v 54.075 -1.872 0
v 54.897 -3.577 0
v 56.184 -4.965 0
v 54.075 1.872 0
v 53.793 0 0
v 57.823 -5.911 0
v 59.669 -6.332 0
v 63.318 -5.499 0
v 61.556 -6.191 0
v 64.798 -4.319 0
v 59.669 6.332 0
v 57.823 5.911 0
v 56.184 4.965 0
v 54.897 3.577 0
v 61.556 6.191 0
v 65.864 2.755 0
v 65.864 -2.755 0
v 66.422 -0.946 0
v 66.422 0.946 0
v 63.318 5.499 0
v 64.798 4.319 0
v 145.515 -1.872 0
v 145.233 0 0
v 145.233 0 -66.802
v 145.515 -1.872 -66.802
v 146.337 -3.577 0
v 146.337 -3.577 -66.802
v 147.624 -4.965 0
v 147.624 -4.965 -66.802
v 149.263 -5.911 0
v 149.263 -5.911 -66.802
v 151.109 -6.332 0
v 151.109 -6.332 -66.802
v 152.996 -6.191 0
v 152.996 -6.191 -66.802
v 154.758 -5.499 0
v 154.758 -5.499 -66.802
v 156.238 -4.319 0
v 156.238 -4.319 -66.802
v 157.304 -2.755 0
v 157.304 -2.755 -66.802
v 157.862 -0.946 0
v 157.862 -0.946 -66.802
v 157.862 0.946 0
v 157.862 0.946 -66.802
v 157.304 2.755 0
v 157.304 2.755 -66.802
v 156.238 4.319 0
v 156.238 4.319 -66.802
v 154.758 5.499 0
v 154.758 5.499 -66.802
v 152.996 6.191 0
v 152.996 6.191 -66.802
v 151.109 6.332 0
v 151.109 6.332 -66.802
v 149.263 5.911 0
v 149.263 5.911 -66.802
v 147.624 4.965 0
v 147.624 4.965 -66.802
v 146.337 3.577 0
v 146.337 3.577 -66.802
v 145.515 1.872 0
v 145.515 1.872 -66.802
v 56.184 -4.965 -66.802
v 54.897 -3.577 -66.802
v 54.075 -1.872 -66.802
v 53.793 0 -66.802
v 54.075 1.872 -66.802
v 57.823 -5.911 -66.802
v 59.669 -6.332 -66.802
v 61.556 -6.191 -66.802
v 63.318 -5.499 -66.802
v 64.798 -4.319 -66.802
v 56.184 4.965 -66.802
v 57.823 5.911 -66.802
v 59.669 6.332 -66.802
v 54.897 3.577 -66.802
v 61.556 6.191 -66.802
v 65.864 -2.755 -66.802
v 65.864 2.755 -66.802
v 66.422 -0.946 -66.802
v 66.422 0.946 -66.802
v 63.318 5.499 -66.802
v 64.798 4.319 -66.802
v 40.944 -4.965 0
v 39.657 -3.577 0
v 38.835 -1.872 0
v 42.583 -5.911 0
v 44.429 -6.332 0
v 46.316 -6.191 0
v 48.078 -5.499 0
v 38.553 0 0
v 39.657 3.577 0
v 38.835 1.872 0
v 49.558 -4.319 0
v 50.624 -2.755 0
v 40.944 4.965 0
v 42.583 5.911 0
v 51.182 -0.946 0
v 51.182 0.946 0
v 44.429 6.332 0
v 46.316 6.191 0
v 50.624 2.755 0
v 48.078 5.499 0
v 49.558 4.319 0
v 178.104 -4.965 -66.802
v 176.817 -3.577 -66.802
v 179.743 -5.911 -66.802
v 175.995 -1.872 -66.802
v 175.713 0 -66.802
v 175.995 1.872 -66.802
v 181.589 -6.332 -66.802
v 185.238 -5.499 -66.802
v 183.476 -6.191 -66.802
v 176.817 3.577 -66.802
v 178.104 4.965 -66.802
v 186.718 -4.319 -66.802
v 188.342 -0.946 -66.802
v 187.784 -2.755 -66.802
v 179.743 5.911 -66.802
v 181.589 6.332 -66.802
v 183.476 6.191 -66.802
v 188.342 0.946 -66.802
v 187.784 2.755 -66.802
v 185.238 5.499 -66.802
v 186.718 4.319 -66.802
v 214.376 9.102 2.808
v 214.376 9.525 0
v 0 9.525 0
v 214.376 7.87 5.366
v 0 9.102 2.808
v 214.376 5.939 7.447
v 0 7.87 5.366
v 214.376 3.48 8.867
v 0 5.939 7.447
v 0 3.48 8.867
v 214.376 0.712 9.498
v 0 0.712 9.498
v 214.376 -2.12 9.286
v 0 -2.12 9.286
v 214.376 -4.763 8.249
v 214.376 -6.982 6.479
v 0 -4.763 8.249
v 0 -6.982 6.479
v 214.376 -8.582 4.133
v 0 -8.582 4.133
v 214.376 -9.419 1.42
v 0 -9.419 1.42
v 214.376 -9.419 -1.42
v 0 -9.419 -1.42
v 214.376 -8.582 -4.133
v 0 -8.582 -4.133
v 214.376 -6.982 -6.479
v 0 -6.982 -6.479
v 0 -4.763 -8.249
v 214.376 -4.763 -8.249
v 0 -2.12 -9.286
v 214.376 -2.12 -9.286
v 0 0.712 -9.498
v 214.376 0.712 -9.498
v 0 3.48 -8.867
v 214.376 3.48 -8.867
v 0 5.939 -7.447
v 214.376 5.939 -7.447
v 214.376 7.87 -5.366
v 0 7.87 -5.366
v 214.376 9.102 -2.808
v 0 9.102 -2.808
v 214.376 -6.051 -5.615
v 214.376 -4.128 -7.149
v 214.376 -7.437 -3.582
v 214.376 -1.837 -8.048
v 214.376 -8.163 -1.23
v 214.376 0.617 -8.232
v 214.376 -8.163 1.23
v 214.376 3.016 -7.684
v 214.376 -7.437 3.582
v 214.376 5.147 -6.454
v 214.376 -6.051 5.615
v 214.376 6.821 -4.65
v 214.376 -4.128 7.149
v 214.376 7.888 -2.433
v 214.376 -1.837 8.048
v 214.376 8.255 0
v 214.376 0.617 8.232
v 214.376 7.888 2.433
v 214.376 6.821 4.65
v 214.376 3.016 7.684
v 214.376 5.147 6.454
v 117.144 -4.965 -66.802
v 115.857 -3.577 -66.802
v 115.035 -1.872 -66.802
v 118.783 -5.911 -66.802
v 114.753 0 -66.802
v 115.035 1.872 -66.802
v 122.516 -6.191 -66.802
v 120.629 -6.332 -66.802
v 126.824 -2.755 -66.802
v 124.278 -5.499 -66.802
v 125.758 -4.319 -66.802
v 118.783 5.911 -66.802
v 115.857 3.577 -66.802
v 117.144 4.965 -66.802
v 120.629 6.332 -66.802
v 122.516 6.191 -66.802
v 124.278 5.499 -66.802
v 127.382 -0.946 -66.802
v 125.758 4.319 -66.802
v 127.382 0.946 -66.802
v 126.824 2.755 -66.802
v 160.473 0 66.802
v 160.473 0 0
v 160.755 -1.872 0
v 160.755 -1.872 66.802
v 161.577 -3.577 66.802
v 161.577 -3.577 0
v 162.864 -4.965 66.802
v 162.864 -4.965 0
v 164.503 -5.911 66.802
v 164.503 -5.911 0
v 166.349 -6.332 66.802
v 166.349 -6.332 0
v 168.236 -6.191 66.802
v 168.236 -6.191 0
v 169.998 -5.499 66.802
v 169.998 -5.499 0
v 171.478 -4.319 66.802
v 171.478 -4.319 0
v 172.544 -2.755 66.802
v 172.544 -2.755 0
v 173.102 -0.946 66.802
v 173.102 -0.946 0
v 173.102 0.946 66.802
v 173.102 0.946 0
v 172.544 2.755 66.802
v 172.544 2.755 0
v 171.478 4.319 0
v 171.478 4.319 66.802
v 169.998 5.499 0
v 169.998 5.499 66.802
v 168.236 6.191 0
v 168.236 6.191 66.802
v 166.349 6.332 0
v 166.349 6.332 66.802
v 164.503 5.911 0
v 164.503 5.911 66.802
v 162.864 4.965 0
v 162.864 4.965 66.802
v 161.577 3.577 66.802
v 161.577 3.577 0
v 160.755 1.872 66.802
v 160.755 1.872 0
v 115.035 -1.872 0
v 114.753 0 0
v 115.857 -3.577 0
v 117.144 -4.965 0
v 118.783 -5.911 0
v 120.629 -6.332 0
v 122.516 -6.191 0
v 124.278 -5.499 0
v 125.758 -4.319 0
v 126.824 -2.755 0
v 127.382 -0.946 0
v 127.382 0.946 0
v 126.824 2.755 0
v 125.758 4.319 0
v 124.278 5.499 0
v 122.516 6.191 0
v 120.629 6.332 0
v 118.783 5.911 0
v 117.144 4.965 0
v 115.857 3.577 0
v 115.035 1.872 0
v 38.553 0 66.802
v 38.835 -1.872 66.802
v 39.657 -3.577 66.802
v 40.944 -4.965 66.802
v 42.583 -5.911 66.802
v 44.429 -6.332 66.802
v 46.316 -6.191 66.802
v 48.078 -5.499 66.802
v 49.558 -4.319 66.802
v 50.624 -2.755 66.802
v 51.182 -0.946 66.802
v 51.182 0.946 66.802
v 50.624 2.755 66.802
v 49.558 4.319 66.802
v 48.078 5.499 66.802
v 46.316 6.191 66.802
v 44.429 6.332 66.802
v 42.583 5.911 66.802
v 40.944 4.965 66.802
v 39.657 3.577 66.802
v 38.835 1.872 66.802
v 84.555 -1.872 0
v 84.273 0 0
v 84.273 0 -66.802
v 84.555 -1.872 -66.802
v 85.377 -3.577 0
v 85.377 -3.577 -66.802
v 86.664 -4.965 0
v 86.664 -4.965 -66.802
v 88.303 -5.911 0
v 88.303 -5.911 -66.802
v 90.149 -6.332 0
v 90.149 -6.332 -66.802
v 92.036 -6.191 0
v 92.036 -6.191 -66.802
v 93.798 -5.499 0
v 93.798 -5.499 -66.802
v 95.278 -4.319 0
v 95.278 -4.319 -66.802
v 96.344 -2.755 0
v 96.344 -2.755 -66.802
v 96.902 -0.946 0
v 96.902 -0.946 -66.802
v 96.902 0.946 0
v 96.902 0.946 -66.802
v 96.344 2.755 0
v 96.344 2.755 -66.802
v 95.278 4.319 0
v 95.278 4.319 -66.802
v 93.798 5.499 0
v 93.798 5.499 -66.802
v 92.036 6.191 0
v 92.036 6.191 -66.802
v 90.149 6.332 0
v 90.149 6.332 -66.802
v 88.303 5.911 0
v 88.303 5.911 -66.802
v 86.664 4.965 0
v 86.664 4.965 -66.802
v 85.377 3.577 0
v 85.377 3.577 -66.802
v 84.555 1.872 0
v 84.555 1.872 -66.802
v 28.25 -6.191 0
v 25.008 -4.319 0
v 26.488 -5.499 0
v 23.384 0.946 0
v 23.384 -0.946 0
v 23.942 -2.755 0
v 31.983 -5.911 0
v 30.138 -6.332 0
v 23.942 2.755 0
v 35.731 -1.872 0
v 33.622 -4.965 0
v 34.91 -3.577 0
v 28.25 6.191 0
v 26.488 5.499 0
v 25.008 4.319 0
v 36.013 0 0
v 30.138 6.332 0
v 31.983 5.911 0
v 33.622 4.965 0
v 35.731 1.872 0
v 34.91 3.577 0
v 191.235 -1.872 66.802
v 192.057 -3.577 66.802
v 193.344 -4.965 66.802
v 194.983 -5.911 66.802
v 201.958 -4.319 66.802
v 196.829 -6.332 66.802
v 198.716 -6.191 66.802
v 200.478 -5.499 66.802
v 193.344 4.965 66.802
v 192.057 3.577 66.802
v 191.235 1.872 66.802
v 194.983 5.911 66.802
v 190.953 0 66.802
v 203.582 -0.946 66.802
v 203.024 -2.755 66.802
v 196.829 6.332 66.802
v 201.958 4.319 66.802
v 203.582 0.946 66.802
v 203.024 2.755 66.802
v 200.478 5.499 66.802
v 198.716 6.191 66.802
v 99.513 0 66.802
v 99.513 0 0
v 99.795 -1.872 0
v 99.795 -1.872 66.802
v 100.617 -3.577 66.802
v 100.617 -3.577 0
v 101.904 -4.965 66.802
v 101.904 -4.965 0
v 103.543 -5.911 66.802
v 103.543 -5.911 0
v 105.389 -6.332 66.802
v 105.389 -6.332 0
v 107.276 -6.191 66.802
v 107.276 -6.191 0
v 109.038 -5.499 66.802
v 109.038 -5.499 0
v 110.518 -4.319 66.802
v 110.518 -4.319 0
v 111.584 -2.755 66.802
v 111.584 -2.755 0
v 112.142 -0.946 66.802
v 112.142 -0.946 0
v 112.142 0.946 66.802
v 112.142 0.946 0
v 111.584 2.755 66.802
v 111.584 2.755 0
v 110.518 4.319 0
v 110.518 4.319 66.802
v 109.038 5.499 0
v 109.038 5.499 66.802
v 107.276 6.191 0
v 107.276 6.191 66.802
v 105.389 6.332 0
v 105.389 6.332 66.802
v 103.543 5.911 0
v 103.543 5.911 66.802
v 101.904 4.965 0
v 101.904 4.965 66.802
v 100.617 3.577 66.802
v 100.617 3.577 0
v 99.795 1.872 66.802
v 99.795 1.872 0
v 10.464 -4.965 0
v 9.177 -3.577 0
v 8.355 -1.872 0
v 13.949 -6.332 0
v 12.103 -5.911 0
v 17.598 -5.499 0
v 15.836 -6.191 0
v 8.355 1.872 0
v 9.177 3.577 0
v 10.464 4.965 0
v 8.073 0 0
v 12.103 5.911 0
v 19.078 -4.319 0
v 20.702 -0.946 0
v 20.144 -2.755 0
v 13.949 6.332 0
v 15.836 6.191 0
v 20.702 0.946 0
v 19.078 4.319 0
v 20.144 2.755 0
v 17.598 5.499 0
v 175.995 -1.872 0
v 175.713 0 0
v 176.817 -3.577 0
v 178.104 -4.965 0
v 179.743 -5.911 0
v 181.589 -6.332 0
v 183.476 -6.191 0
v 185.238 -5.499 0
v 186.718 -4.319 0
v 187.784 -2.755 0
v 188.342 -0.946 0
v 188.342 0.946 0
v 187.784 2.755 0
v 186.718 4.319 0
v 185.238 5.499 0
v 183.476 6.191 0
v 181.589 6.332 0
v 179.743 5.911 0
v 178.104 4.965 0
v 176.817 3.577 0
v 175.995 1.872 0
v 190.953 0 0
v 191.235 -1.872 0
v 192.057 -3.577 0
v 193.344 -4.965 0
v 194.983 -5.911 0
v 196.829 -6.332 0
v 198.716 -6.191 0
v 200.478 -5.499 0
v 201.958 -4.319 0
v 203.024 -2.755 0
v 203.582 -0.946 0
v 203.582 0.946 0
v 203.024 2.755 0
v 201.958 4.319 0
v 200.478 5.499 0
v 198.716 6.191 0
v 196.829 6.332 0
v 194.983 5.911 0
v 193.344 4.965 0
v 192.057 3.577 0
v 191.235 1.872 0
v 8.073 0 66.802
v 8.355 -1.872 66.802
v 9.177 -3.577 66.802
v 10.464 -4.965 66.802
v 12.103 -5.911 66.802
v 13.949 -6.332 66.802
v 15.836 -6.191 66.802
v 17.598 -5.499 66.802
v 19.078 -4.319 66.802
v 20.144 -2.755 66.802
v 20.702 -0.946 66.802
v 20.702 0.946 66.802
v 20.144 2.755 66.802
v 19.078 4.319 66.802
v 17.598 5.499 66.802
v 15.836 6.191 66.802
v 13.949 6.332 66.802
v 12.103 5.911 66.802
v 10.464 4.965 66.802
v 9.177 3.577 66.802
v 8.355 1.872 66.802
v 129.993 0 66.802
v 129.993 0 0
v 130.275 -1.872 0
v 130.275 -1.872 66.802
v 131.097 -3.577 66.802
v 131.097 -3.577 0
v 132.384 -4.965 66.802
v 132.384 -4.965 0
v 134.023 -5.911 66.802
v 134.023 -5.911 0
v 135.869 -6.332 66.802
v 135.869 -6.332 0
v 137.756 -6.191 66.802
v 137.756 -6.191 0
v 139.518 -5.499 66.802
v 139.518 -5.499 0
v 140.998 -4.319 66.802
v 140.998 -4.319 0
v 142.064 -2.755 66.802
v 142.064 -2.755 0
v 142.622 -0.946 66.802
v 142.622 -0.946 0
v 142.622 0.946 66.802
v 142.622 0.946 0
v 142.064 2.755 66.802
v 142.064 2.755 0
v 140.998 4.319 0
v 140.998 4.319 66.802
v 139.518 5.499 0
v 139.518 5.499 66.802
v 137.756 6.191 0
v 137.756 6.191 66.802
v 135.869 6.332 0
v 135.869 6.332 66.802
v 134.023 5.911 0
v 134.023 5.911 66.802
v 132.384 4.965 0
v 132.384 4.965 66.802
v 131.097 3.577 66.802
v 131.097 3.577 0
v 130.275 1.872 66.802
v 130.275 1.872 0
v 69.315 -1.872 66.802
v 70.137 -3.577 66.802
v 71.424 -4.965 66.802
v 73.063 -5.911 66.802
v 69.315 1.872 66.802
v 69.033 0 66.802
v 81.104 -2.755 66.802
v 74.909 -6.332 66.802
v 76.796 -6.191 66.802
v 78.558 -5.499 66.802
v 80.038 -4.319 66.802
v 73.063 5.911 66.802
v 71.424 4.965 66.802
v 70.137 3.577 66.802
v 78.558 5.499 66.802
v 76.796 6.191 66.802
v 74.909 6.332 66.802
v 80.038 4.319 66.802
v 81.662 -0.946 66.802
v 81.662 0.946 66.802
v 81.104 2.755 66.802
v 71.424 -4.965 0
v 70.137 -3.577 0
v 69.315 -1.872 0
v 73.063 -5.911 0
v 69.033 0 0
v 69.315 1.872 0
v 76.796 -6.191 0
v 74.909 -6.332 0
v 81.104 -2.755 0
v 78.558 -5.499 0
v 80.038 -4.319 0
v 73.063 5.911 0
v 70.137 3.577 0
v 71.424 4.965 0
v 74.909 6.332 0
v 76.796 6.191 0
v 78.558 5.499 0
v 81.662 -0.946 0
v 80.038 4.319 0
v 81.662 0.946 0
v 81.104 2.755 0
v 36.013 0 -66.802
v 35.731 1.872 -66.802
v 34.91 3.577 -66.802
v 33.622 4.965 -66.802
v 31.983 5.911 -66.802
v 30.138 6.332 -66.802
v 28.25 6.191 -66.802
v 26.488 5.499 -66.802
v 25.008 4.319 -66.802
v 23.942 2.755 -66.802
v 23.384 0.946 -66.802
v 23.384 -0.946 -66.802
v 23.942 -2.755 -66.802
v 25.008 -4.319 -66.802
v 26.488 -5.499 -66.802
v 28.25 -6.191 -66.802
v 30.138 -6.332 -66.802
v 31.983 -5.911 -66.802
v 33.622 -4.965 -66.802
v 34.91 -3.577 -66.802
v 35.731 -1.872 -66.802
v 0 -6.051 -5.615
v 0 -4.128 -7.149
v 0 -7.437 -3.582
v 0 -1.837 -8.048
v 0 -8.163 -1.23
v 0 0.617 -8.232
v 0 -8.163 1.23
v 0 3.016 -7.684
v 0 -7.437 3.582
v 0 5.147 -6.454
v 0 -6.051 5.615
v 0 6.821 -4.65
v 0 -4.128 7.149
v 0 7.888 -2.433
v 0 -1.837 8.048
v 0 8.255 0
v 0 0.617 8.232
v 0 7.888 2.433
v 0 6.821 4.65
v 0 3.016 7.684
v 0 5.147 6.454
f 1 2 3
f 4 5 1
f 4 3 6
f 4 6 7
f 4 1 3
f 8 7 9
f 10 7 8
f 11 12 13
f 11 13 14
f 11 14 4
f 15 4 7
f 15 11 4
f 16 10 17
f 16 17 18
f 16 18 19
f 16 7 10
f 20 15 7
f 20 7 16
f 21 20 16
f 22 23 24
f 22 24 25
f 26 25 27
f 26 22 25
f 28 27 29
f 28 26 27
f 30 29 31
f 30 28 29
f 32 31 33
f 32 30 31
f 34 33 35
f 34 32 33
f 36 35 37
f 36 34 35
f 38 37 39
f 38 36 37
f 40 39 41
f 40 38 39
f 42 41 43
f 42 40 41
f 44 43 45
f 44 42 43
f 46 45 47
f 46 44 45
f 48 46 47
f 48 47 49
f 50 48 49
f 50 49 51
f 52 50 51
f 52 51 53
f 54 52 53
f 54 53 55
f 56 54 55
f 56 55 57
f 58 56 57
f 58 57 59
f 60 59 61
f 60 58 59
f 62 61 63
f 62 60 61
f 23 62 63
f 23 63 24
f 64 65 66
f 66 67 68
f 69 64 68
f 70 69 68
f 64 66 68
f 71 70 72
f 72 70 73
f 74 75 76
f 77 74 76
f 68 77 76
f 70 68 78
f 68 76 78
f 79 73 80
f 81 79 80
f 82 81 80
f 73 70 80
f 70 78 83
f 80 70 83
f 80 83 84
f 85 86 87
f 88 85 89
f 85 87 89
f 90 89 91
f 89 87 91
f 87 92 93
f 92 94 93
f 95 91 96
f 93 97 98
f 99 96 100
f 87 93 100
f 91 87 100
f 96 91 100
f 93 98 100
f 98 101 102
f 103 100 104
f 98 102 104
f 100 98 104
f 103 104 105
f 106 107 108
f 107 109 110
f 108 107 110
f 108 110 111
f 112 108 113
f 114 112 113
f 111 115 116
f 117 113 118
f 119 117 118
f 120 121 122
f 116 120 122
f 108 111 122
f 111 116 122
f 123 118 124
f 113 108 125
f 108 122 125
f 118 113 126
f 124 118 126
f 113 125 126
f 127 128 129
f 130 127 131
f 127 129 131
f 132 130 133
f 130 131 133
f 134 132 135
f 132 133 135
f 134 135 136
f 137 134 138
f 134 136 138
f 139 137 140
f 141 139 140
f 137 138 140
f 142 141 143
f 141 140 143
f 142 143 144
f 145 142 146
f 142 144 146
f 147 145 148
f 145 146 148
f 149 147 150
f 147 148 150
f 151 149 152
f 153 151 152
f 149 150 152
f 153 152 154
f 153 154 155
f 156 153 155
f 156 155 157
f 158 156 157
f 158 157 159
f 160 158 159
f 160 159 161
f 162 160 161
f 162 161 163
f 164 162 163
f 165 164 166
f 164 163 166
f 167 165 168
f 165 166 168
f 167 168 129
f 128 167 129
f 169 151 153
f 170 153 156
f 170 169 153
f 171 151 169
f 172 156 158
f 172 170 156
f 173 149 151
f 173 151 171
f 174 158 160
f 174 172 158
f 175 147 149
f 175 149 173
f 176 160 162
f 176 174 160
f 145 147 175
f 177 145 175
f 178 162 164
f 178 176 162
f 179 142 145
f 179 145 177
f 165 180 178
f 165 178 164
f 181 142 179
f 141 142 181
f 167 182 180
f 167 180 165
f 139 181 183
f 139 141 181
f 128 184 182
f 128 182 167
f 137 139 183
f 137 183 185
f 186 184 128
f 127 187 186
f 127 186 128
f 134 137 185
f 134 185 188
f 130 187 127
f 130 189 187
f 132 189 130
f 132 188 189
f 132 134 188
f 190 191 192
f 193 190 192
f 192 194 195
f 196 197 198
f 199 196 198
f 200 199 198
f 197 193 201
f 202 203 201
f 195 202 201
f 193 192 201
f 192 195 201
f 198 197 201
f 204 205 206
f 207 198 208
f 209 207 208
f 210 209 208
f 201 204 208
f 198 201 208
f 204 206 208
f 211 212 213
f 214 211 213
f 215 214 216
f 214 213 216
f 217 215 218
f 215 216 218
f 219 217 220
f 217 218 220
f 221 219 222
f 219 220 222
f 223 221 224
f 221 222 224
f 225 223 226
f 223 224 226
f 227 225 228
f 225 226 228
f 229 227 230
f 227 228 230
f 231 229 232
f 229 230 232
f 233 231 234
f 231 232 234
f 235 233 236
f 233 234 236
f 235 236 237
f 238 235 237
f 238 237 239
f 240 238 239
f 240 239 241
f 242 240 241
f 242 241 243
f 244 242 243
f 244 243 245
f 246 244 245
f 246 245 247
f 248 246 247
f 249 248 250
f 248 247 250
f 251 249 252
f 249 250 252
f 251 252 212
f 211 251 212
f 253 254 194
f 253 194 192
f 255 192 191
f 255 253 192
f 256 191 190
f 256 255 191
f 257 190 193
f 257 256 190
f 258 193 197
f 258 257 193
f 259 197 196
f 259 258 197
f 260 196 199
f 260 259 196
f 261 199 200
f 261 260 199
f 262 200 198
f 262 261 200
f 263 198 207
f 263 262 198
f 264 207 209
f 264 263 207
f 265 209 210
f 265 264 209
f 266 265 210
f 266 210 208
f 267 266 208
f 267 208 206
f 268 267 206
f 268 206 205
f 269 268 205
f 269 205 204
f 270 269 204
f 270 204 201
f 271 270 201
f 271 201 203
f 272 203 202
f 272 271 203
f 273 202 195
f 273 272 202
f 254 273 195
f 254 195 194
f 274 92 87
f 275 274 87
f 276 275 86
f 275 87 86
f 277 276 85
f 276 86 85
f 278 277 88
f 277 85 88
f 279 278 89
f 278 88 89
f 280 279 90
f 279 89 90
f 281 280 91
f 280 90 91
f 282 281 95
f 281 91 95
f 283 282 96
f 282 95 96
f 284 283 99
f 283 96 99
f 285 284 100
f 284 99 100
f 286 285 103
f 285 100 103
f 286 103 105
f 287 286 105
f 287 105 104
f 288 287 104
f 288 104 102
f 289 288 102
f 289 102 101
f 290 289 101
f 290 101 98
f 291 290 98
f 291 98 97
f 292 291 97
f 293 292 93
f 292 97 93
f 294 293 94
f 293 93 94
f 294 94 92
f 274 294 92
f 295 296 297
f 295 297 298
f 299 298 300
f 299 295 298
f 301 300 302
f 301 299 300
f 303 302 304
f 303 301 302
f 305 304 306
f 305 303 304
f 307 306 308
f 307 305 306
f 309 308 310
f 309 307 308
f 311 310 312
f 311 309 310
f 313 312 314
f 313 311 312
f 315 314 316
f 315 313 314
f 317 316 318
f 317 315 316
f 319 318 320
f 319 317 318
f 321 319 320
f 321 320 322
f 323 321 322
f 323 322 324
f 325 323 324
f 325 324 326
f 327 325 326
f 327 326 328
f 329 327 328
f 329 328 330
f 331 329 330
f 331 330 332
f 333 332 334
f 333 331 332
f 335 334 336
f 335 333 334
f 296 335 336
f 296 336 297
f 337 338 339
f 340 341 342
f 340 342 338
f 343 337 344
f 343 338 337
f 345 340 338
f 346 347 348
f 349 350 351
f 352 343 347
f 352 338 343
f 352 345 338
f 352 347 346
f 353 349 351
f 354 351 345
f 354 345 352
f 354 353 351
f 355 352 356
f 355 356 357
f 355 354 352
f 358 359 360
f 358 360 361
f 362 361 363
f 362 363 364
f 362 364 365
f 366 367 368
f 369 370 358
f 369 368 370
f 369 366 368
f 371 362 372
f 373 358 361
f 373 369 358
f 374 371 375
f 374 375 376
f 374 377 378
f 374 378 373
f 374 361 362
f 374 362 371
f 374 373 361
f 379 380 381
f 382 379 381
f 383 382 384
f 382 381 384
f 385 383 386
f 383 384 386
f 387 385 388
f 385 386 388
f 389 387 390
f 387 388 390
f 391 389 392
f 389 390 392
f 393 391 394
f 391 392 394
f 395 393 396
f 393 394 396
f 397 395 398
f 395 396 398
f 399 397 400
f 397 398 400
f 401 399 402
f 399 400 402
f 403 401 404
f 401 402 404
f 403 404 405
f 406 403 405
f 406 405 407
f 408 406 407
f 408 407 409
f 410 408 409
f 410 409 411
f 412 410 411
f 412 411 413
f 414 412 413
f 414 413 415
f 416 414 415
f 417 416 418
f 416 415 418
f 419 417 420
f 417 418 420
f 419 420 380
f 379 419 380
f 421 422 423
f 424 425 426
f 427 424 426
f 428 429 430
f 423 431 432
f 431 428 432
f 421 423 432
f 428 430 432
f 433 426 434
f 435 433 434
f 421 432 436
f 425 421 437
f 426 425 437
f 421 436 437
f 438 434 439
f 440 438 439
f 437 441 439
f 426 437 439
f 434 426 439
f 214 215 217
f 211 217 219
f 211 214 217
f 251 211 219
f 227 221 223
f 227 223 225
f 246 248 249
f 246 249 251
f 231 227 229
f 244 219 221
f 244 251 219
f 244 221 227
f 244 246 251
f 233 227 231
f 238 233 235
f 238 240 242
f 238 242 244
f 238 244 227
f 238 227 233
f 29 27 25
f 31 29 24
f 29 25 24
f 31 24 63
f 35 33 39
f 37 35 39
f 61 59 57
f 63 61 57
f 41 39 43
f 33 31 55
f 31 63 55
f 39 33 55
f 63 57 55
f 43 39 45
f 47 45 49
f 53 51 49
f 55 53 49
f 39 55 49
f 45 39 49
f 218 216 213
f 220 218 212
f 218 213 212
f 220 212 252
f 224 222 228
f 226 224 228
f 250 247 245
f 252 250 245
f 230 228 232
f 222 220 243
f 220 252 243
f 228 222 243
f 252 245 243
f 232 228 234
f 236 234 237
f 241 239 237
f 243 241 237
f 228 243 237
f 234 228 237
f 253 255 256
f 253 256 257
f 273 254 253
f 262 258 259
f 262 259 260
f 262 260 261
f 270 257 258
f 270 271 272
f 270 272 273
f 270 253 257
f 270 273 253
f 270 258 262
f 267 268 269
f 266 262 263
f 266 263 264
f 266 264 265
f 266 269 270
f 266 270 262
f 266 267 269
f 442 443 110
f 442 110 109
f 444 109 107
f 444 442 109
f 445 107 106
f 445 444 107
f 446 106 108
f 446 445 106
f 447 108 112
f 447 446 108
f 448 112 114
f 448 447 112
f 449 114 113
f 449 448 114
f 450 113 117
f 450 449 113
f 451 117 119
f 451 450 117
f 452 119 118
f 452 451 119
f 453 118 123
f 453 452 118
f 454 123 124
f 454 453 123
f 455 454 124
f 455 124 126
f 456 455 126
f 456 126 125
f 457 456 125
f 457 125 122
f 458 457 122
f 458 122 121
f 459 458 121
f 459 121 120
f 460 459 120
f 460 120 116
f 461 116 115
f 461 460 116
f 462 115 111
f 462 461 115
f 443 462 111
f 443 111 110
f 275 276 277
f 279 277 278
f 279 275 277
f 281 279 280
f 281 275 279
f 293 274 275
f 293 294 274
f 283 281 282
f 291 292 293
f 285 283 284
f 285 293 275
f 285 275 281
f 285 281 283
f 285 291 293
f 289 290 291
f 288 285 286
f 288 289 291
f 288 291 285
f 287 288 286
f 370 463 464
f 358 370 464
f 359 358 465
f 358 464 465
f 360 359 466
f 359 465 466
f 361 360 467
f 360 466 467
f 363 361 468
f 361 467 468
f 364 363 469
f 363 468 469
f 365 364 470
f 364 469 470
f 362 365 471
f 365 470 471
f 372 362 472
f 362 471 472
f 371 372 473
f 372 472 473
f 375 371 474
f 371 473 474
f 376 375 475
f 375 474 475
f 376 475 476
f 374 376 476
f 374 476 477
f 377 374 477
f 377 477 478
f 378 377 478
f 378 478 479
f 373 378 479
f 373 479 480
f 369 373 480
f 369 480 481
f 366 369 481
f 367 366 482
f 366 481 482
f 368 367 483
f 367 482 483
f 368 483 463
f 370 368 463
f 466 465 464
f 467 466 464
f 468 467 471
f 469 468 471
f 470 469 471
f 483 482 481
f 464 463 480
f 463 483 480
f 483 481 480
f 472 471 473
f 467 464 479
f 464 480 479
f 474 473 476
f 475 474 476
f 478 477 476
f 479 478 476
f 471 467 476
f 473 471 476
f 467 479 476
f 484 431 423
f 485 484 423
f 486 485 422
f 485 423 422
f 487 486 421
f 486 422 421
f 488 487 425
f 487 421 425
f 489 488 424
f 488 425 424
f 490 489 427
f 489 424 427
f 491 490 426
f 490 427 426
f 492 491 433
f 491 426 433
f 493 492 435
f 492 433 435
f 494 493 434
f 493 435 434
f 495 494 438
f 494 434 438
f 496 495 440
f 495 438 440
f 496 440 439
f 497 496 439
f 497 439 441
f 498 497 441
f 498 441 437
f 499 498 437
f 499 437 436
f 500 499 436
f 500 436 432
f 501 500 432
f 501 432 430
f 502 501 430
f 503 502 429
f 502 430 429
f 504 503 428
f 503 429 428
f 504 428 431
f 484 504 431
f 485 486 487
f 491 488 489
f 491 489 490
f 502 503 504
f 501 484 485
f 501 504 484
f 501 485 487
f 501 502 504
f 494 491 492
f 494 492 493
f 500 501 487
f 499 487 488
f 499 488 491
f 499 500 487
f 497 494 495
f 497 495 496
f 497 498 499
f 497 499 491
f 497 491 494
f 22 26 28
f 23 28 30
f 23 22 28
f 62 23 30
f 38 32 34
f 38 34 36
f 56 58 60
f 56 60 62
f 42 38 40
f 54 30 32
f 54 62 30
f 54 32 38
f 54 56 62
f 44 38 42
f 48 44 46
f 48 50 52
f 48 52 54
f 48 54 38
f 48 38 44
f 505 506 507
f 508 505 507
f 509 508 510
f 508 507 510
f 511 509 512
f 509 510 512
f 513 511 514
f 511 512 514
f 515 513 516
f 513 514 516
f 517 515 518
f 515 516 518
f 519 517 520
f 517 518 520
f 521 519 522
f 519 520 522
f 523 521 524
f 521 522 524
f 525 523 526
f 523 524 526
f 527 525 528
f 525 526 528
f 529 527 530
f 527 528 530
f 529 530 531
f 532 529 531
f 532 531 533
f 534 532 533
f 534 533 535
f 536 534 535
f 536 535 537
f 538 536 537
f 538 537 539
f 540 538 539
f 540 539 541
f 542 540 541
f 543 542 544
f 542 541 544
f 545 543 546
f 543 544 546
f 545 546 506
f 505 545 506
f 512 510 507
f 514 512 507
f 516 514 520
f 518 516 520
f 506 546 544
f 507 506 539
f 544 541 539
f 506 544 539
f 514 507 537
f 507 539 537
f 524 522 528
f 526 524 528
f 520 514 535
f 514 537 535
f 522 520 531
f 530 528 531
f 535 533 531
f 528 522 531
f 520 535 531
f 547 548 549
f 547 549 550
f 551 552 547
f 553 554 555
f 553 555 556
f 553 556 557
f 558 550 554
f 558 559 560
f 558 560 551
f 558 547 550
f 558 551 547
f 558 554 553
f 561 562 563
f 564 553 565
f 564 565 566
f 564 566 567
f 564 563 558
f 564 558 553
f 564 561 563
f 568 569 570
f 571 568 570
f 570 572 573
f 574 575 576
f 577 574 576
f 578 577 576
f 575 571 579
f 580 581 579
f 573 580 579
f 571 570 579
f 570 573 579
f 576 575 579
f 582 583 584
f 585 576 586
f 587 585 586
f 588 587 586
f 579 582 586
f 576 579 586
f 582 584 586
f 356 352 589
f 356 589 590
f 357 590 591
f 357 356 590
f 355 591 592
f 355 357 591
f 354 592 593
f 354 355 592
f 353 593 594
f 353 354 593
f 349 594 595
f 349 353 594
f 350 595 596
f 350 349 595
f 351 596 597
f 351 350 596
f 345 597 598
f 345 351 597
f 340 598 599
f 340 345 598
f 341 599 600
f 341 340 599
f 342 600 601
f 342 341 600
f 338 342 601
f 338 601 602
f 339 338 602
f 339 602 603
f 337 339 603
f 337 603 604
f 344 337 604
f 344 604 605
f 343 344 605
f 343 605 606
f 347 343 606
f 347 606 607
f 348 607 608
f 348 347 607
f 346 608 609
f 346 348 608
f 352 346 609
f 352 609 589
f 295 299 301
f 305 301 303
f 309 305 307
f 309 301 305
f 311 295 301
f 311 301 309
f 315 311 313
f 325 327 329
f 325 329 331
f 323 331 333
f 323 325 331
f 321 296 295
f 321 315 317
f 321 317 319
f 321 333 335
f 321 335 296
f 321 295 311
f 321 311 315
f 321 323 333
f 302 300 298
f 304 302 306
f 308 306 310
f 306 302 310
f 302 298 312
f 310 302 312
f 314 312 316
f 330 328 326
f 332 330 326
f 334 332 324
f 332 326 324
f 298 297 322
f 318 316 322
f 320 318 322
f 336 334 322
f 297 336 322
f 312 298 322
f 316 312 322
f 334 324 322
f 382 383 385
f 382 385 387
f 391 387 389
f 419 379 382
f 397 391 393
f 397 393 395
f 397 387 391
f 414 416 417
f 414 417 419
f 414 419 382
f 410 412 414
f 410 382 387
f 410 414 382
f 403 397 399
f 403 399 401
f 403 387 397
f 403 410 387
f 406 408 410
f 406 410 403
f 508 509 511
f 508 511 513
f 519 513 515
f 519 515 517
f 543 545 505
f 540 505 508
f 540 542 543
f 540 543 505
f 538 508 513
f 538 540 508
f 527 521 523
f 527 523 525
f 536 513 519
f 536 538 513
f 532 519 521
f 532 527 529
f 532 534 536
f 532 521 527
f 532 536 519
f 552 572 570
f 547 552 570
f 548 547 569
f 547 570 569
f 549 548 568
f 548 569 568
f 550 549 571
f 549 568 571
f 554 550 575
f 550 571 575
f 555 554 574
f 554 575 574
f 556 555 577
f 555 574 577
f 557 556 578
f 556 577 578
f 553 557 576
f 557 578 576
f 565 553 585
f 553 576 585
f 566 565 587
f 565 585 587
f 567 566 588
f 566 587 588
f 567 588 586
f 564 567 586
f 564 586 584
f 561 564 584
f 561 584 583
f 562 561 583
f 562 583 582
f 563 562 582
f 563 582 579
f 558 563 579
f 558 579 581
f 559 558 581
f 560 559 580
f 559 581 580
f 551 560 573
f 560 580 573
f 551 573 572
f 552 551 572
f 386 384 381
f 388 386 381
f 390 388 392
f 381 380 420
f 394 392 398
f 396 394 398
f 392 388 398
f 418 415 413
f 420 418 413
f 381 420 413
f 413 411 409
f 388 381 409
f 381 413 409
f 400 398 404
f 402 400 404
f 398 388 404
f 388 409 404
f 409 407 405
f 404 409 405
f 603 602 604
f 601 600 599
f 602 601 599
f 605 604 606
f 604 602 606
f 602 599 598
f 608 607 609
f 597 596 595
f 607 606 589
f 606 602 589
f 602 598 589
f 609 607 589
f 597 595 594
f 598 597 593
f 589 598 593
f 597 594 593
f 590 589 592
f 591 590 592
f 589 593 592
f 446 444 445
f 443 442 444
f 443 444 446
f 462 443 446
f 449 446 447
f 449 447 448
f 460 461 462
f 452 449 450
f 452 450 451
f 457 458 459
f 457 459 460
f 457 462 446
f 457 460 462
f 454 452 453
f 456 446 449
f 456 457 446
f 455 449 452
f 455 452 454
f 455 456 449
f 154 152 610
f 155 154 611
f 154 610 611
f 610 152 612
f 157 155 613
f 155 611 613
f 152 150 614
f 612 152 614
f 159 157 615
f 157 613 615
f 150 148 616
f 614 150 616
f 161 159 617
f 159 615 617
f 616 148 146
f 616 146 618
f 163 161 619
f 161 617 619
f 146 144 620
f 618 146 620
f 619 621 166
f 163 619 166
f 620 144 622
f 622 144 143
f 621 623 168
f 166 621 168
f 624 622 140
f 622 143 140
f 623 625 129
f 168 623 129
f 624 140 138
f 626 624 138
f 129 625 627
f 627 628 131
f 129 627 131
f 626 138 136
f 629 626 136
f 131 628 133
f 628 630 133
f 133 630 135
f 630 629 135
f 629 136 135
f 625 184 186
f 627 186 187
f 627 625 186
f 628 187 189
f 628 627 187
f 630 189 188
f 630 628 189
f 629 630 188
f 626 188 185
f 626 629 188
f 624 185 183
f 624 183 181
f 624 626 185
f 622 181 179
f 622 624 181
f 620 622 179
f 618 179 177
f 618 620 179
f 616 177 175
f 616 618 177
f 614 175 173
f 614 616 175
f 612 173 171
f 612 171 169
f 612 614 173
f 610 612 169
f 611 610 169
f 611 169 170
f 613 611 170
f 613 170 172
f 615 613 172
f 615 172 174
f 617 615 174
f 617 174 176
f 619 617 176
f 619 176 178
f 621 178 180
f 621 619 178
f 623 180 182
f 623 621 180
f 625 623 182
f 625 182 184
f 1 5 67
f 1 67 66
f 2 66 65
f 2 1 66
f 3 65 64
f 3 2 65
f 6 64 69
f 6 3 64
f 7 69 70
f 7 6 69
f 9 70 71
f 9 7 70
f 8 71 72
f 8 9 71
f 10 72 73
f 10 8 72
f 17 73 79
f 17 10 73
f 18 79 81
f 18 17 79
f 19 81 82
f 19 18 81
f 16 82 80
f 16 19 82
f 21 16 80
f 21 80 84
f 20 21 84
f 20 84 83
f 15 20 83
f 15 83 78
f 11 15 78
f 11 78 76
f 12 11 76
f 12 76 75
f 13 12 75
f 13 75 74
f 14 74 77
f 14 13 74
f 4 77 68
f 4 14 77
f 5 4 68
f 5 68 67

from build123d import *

# Parameters (mm, degrees)
F0_R     = 9.525
F0_R_2   = 8.255
F1_DEPTH = 214.376
F3_DEPTH = 66.802
F4_DEPTH = 66.802


with BuildPart() as f1:
    # F0 (on Right) → F1 (new body)
    with BuildSketch(Plane.YZ):
        Circle(F0_R)
        Circle(F0_R_2, mode=Mode.SUBTRACT)
    extrude(amount=F1_DEPTH)


with BuildPart() as f3:
    # F2 (on Top) → F3 (new body)
    with BuildSketch(Plane.XY):
        with BuildLine():
            ThreePointArc((20.7733392388, 0), (14.4233392388, 6.35), (8.0733392388, 0))
            Line((8.0733392388, 0), (14.4233392388, 0))
            Line((14.4233392388, 0), (20.7733392388, 0))
        make_face()
        with BuildLine():
            Line((14.4233392388, 0), (8.0733392388, 0))
            ThreePointArc((8.0733392388, 0), (14.4233392388, -6.35), (20.7733392388, 0))
            Line((20.7733392388, 0), (14.4233392388, 0))
        make_face()
    extrude(amount=F3_DEPTH)


with BuildPart() as f3b:
    # F2 (on Top) → F3, piece 2 (new body)
    with BuildSketch(Plane.XY):
        with BuildLine():
            ThreePointArc((203.6533392388, 0), (197.3033392388, 6.35), (190.9533392388, 0))
            Line((190.9533392388, 0), (198.5922306776, 0))
            Line((198.5922306776, 0), (203.6533392388, 0))
        make_face()
        with BuildLine():
            Line((198.5922306776, 0), (190.9533392388, 0))
            ThreePointArc((190.9533392388, 0), (197.3033392388, -6.35), (203.6533392388, 0))
            Line((203.6533392388, 0), (198.5922306776, 0))
        make_face()
    extrude(amount=F3_DEPTH)


with BuildPart() as f3c:
    # F2 (on Top) → F3, piece 3 (new body)
    with BuildSketch(Plane.XY):
        with BuildLine():
            ThreePointArc((173.1733392388, 0), (166.8233392388, 6.35), (160.4733392388, 0))
            Line((160.4733392388, 0), (173.1733392388, 0))
        make_face()
        with BuildLine():
            Line((173.1733392388, 0), (160.4733392388, 0))
            ThreePointArc((160.4733392388, 0), (166.8233392388, -6.35), (173.1733392388, 0))
        make_face()
    extrude(amount=F3_DEPTH)


with BuildPart() as f3d:
    # F2 (on Top) → F3, piece 4 (new body)
    with BuildSketch(Plane.XY):
        with BuildLine():
            ThreePointArc((142.6933392388, 0), (136.3433392388, 6.35), (129.9933392388, 0))
            Line((129.9933392388, 0), (142.6933392388, 0))
        make_face()
        with BuildLine():
            Line((142.6933392388, 0), (129.9933392388, 0))
            ThreePointArc((129.9933392388, 0), (136.3433392388, -6.35), (142.6933392388, 0))
        make_face()
    extrude(amount=F3_DEPTH)


with BuildPart() as f3e:
    # F2 (on Top) → F3, piece 5 (new body)
    with BuildSketch(Plane.XY):
        with BuildLine():
            ThreePointArc((112.2133392388, 0), (105.8633392388, 6.35), (99.5133392388, 0))
            Line((99.5133392388, 0), (112.2133392388, 0))
        make_face()
        with BuildLine():
            Line((112.2133392388, 0), (99.5133392388, 0))
            ThreePointArc((99.5133392388, 0), (105.8633392388, -6.35), (112.2133392388, 0))
        make_face()
    extrude(amount=F3_DEPTH)


with BuildPart() as f3f:
    # F2 (on Top) → F3, piece 6 (new body)
    with BuildSketch(Plane.XY):
        with BuildLine():
            ThreePointArc((81.7333392388, 0), (75.3833392388, 6.35), (69.0333392388, 0))
            Line((69.0333392388, 0), (81.7333392388, 0))
        make_face()
        with BuildLine():
            Line((81.7333392388, 0), (69.0333392388, 0))
            ThreePointArc((69.0333392388, 0), (75.3833392388, -6.35), (81.7333392388, 0))
        make_face()
    extrude(amount=F3_DEPTH)


with BuildPart() as f3g:
    # F2 (on Top) → F3, piece 7 (new body)
    with BuildSketch(Plane.XY):
        with BuildLine():
            ThreePointArc((51.2533392388, 0), (44.9033392388, 6.35), (38.5533392388, 0))
            Line((38.5533392388, 0), (51.2533392388, 0))
        make_face()
        with BuildLine():
            Line((51.2533392388, 0), (38.5533392388, 0))
            ThreePointArc((38.5533392388, 0), (44.9033392388, -6.35), (51.2533392388, 0))
        make_face()
    extrude(amount=F3_DEPTH)


with BuildPart() as f4:
    # F2 (on Top) → F4 (new body)
    with BuildSketch(Plane.XY):
        with BuildLine():
            Line((36.0133392388, 0), (23.3133392388, 0))
            ThreePointArc((23.3133392388, 0), (29.6633392388, -6.35), (36.0133392388, 0))
        make_face()
        with BuildLine():
            ThreePointArc((36.0133392388, 0), (29.6633392388, 6.35), (23.3133392388, 0))
            Line((23.3133392388, 0), (36.0133392388, 0))
        make_face()
    extrude(amount=-F4_DEPTH)


with BuildPart() as f4b:
    # F2 (on Top) → F4, piece 2 (new body)
    with BuildSketch(Plane.XY):
        with BuildLine():
            ThreePointArc((66.4933392388, 0), (60.1433392388, 6.35), (53.7933392388, 0))
            Line((53.7933392388, 0), (66.4933392388, 0))
        make_face()
        with BuildLine():
            Line((66.4933392388, 0), (53.7933392388, 0))
            ThreePointArc((53.7933392388, 0), (60.1433392388, -6.35), (66.4933392388, 0))
        make_face()
    extrude(amount=-F4_DEPTH)


with BuildPart() as f4c:
    # F2 (on Top) → F4, piece 3 (new body)
    with BuildSketch(Plane.XY):
        with BuildLine():
            ThreePointArc((96.9733392388, 0), (90.6233392388, 6.35), (84.2733392388, 0))
            Line((84.2733392388, 0), (96.9733392388, 0))
        make_face()
        with BuildLine():
            Line((96.9733392388, 0), (84.2733392388, 0))
            ThreePointArc((84.2733392388, 0), (90.6233392388, -6.35), (96.9733392388, 0))
        make_face()
    extrude(amount=-F4_DEPTH)


with BuildPart() as f4d:
    # F2 (on Top) → F4, piece 4 (new body)
    with BuildSketch(Plane.XY):
        with BuildLine():
            ThreePointArc((127.4533392388, 0), (121.1033392388, 6.35), (114.7533392388, 0))
            Line((114.7533392388, 0), (127.4533392388, 0))
        make_face()
        with BuildLine():
            Line((127.4533392388, 0), (114.7533392388, 0))
            ThreePointArc((114.7533392388, 0), (121.1033392388, -6.35), (127.4533392388, 0))
        make_face()
    extrude(amount=-F4_DEPTH)


with BuildPart() as f4e:
    # F2 (on Top) → F4, piece 5 (new body)
    with BuildSketch(Plane.XY):
        with BuildLine():
            ThreePointArc((157.9333392388, 0), (151.5833392388, 6.35), (145.2333392388, 0))
            Line((145.2333392388, 0), (157.9333392388, 0))
        make_face()
        with BuildLine():
            Line((157.9333392388, 0), (145.2333392388, 0))
            ThreePointArc((145.2333392388, 0), (151.5833392388, -6.35), (157.9333392388, 0))
        make_face()
    extrude(amount=-F4_DEPTH)


with BuildPart() as f4f:
    # F2 (on Top) → F4, piece 6 (new body)
    with BuildSketch(Plane.XY):
        with BuildLine():
            ThreePointArc((188.4133392388, 0), (182.0633392388, 6.35), (175.7133392388, 0))
            Line((175.7133392388, 0), (188.4133392388, 0))
        make_face()
        with BuildLine():
            Line((188.4133392388, 0), (175.7133392388, 0))
            ThreePointArc((175.7133392388, 0), (182.0633392388, -6.35), (188.4133392388, 0))
        make_face()
    extrude(amount=-F4_DEPTH)


solid = Compound([f1.part, f3.part, f3b.part, f3c.part, f3d.part, f3e.part, f3f.part, f3g.part, f4.part, f4b.part, f4c.part, f4d.part, f4e.part, f4f.part])
